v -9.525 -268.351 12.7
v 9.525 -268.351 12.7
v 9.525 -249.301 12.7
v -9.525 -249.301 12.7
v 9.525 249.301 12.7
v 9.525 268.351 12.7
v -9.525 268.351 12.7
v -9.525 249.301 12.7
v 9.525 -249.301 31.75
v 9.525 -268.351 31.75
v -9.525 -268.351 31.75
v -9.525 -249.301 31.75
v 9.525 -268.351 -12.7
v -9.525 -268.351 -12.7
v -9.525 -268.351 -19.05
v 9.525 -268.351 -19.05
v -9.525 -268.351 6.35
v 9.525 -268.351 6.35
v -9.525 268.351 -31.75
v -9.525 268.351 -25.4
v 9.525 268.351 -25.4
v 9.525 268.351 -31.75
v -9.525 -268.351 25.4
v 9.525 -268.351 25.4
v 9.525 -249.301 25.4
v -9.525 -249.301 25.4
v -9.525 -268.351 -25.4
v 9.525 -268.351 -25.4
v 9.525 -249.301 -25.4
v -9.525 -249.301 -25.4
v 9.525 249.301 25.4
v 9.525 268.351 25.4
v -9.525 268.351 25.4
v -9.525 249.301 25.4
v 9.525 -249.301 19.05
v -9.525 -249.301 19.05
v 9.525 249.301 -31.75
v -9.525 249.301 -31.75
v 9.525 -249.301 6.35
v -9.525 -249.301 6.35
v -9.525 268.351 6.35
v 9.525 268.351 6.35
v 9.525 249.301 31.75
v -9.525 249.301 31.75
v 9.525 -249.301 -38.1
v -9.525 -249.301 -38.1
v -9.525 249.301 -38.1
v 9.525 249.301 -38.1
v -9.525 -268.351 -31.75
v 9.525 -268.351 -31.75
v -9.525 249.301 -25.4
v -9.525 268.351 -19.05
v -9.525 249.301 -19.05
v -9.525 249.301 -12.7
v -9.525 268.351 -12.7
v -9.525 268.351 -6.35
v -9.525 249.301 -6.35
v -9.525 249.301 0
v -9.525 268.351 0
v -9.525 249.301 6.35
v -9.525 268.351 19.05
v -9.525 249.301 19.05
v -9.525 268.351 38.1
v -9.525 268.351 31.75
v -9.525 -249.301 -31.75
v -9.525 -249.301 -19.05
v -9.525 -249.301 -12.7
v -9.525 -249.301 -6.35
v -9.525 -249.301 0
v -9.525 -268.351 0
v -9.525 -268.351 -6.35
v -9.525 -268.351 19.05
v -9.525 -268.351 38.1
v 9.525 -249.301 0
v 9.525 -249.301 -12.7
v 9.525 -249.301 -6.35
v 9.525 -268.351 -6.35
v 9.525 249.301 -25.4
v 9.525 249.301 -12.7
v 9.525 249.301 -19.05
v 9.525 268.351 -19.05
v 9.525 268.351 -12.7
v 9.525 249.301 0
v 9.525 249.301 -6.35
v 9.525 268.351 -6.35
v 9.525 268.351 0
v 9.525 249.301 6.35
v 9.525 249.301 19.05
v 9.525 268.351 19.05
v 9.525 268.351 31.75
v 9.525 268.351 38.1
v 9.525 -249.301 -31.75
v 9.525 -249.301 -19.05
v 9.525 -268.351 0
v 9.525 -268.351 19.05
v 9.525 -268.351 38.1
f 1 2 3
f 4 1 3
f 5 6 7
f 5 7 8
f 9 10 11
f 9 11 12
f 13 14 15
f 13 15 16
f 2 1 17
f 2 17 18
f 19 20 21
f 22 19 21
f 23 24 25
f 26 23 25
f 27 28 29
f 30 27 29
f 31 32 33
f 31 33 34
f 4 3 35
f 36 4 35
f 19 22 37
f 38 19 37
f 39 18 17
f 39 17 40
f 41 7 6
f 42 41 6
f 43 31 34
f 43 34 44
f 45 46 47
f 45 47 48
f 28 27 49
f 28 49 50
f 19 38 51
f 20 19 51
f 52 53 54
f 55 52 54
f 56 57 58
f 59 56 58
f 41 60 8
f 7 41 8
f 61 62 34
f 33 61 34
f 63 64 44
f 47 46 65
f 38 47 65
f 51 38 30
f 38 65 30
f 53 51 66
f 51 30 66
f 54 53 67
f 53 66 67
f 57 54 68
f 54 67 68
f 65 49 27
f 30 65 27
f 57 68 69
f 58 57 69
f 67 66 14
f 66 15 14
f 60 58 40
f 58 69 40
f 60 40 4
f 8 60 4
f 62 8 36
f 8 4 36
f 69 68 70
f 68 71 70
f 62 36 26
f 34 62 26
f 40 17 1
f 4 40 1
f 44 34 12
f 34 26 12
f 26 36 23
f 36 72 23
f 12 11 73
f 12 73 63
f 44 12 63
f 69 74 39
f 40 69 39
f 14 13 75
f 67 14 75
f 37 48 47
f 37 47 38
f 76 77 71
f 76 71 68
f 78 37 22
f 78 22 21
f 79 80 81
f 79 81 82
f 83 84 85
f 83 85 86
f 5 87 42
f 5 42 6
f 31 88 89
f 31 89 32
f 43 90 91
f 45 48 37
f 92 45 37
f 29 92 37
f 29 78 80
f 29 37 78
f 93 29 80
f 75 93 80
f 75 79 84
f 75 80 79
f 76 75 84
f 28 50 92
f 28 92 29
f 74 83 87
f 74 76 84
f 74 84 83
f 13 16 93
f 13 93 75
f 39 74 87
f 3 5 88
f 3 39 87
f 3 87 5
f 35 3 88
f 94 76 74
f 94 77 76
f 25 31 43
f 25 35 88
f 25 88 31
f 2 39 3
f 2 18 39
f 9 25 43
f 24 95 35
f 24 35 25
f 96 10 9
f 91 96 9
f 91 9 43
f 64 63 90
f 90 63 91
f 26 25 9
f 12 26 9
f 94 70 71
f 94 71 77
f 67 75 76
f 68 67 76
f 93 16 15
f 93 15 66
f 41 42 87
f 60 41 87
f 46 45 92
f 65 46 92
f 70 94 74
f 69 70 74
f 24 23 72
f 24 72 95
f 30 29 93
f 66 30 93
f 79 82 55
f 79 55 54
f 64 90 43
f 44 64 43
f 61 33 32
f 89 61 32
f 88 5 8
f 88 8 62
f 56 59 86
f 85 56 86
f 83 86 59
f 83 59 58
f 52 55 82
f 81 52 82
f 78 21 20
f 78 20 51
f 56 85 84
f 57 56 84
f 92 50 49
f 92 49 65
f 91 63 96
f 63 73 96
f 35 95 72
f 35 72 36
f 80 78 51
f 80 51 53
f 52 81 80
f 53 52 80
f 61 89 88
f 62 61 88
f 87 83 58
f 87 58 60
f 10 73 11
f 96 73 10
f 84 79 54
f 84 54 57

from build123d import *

# Parameters (mm, degrees)
F0_W     = 19.05
F0_H     = 76.2
F1_DEPTH = 268.351
F2_W     = 19.05
F2_H     = 6.35
F3_DEPTH = 19.051


# Not quite as in the source:
# - a pattern or mirror of a feature is missing from the dataset's text; its kind, count and spacing are read off the source's solid


with BuildPart() as f1:
    # F0 (on Front) → F1 (new body, symmetric)
    with BuildSketch(Plane.XZ):
        Rectangle(F0_W, F0_H)
    extrude(amount=F1_DEPTH, both=True)

    # F2 (on face) → F3 (cut, through all)
    with BuildSketch(Plane.YZ.offset(9.525)):
        with Locations((-258.826, 28.575)):
            Rectangle(F2_W, F2_H)
        with Locations((-258.826, 3.175)):
            Rectangle(F2_W, F2_H)
        with Locations((-258.826, -9.525)):
            Rectangle(F2_W, F2_H)
        with Locations((-258.826, -22.225)):
            Rectangle(F2_W, F2_H)
        with Locations((-258.826, 15.875)):
            Rectangle(F2_W, F2_H)
        with Locations((-258.826, -34.925)):
            Rectangle(F2_W, F2_H)
    f3 = extrude(amount=-F3_DEPTH, mode=Mode.SUBTRACT)

    # F3_copies: F3 across plane
    add(f3.mirror(Plane.ZX), mode=Mode.SUBTRACT)


solid = f1.part
